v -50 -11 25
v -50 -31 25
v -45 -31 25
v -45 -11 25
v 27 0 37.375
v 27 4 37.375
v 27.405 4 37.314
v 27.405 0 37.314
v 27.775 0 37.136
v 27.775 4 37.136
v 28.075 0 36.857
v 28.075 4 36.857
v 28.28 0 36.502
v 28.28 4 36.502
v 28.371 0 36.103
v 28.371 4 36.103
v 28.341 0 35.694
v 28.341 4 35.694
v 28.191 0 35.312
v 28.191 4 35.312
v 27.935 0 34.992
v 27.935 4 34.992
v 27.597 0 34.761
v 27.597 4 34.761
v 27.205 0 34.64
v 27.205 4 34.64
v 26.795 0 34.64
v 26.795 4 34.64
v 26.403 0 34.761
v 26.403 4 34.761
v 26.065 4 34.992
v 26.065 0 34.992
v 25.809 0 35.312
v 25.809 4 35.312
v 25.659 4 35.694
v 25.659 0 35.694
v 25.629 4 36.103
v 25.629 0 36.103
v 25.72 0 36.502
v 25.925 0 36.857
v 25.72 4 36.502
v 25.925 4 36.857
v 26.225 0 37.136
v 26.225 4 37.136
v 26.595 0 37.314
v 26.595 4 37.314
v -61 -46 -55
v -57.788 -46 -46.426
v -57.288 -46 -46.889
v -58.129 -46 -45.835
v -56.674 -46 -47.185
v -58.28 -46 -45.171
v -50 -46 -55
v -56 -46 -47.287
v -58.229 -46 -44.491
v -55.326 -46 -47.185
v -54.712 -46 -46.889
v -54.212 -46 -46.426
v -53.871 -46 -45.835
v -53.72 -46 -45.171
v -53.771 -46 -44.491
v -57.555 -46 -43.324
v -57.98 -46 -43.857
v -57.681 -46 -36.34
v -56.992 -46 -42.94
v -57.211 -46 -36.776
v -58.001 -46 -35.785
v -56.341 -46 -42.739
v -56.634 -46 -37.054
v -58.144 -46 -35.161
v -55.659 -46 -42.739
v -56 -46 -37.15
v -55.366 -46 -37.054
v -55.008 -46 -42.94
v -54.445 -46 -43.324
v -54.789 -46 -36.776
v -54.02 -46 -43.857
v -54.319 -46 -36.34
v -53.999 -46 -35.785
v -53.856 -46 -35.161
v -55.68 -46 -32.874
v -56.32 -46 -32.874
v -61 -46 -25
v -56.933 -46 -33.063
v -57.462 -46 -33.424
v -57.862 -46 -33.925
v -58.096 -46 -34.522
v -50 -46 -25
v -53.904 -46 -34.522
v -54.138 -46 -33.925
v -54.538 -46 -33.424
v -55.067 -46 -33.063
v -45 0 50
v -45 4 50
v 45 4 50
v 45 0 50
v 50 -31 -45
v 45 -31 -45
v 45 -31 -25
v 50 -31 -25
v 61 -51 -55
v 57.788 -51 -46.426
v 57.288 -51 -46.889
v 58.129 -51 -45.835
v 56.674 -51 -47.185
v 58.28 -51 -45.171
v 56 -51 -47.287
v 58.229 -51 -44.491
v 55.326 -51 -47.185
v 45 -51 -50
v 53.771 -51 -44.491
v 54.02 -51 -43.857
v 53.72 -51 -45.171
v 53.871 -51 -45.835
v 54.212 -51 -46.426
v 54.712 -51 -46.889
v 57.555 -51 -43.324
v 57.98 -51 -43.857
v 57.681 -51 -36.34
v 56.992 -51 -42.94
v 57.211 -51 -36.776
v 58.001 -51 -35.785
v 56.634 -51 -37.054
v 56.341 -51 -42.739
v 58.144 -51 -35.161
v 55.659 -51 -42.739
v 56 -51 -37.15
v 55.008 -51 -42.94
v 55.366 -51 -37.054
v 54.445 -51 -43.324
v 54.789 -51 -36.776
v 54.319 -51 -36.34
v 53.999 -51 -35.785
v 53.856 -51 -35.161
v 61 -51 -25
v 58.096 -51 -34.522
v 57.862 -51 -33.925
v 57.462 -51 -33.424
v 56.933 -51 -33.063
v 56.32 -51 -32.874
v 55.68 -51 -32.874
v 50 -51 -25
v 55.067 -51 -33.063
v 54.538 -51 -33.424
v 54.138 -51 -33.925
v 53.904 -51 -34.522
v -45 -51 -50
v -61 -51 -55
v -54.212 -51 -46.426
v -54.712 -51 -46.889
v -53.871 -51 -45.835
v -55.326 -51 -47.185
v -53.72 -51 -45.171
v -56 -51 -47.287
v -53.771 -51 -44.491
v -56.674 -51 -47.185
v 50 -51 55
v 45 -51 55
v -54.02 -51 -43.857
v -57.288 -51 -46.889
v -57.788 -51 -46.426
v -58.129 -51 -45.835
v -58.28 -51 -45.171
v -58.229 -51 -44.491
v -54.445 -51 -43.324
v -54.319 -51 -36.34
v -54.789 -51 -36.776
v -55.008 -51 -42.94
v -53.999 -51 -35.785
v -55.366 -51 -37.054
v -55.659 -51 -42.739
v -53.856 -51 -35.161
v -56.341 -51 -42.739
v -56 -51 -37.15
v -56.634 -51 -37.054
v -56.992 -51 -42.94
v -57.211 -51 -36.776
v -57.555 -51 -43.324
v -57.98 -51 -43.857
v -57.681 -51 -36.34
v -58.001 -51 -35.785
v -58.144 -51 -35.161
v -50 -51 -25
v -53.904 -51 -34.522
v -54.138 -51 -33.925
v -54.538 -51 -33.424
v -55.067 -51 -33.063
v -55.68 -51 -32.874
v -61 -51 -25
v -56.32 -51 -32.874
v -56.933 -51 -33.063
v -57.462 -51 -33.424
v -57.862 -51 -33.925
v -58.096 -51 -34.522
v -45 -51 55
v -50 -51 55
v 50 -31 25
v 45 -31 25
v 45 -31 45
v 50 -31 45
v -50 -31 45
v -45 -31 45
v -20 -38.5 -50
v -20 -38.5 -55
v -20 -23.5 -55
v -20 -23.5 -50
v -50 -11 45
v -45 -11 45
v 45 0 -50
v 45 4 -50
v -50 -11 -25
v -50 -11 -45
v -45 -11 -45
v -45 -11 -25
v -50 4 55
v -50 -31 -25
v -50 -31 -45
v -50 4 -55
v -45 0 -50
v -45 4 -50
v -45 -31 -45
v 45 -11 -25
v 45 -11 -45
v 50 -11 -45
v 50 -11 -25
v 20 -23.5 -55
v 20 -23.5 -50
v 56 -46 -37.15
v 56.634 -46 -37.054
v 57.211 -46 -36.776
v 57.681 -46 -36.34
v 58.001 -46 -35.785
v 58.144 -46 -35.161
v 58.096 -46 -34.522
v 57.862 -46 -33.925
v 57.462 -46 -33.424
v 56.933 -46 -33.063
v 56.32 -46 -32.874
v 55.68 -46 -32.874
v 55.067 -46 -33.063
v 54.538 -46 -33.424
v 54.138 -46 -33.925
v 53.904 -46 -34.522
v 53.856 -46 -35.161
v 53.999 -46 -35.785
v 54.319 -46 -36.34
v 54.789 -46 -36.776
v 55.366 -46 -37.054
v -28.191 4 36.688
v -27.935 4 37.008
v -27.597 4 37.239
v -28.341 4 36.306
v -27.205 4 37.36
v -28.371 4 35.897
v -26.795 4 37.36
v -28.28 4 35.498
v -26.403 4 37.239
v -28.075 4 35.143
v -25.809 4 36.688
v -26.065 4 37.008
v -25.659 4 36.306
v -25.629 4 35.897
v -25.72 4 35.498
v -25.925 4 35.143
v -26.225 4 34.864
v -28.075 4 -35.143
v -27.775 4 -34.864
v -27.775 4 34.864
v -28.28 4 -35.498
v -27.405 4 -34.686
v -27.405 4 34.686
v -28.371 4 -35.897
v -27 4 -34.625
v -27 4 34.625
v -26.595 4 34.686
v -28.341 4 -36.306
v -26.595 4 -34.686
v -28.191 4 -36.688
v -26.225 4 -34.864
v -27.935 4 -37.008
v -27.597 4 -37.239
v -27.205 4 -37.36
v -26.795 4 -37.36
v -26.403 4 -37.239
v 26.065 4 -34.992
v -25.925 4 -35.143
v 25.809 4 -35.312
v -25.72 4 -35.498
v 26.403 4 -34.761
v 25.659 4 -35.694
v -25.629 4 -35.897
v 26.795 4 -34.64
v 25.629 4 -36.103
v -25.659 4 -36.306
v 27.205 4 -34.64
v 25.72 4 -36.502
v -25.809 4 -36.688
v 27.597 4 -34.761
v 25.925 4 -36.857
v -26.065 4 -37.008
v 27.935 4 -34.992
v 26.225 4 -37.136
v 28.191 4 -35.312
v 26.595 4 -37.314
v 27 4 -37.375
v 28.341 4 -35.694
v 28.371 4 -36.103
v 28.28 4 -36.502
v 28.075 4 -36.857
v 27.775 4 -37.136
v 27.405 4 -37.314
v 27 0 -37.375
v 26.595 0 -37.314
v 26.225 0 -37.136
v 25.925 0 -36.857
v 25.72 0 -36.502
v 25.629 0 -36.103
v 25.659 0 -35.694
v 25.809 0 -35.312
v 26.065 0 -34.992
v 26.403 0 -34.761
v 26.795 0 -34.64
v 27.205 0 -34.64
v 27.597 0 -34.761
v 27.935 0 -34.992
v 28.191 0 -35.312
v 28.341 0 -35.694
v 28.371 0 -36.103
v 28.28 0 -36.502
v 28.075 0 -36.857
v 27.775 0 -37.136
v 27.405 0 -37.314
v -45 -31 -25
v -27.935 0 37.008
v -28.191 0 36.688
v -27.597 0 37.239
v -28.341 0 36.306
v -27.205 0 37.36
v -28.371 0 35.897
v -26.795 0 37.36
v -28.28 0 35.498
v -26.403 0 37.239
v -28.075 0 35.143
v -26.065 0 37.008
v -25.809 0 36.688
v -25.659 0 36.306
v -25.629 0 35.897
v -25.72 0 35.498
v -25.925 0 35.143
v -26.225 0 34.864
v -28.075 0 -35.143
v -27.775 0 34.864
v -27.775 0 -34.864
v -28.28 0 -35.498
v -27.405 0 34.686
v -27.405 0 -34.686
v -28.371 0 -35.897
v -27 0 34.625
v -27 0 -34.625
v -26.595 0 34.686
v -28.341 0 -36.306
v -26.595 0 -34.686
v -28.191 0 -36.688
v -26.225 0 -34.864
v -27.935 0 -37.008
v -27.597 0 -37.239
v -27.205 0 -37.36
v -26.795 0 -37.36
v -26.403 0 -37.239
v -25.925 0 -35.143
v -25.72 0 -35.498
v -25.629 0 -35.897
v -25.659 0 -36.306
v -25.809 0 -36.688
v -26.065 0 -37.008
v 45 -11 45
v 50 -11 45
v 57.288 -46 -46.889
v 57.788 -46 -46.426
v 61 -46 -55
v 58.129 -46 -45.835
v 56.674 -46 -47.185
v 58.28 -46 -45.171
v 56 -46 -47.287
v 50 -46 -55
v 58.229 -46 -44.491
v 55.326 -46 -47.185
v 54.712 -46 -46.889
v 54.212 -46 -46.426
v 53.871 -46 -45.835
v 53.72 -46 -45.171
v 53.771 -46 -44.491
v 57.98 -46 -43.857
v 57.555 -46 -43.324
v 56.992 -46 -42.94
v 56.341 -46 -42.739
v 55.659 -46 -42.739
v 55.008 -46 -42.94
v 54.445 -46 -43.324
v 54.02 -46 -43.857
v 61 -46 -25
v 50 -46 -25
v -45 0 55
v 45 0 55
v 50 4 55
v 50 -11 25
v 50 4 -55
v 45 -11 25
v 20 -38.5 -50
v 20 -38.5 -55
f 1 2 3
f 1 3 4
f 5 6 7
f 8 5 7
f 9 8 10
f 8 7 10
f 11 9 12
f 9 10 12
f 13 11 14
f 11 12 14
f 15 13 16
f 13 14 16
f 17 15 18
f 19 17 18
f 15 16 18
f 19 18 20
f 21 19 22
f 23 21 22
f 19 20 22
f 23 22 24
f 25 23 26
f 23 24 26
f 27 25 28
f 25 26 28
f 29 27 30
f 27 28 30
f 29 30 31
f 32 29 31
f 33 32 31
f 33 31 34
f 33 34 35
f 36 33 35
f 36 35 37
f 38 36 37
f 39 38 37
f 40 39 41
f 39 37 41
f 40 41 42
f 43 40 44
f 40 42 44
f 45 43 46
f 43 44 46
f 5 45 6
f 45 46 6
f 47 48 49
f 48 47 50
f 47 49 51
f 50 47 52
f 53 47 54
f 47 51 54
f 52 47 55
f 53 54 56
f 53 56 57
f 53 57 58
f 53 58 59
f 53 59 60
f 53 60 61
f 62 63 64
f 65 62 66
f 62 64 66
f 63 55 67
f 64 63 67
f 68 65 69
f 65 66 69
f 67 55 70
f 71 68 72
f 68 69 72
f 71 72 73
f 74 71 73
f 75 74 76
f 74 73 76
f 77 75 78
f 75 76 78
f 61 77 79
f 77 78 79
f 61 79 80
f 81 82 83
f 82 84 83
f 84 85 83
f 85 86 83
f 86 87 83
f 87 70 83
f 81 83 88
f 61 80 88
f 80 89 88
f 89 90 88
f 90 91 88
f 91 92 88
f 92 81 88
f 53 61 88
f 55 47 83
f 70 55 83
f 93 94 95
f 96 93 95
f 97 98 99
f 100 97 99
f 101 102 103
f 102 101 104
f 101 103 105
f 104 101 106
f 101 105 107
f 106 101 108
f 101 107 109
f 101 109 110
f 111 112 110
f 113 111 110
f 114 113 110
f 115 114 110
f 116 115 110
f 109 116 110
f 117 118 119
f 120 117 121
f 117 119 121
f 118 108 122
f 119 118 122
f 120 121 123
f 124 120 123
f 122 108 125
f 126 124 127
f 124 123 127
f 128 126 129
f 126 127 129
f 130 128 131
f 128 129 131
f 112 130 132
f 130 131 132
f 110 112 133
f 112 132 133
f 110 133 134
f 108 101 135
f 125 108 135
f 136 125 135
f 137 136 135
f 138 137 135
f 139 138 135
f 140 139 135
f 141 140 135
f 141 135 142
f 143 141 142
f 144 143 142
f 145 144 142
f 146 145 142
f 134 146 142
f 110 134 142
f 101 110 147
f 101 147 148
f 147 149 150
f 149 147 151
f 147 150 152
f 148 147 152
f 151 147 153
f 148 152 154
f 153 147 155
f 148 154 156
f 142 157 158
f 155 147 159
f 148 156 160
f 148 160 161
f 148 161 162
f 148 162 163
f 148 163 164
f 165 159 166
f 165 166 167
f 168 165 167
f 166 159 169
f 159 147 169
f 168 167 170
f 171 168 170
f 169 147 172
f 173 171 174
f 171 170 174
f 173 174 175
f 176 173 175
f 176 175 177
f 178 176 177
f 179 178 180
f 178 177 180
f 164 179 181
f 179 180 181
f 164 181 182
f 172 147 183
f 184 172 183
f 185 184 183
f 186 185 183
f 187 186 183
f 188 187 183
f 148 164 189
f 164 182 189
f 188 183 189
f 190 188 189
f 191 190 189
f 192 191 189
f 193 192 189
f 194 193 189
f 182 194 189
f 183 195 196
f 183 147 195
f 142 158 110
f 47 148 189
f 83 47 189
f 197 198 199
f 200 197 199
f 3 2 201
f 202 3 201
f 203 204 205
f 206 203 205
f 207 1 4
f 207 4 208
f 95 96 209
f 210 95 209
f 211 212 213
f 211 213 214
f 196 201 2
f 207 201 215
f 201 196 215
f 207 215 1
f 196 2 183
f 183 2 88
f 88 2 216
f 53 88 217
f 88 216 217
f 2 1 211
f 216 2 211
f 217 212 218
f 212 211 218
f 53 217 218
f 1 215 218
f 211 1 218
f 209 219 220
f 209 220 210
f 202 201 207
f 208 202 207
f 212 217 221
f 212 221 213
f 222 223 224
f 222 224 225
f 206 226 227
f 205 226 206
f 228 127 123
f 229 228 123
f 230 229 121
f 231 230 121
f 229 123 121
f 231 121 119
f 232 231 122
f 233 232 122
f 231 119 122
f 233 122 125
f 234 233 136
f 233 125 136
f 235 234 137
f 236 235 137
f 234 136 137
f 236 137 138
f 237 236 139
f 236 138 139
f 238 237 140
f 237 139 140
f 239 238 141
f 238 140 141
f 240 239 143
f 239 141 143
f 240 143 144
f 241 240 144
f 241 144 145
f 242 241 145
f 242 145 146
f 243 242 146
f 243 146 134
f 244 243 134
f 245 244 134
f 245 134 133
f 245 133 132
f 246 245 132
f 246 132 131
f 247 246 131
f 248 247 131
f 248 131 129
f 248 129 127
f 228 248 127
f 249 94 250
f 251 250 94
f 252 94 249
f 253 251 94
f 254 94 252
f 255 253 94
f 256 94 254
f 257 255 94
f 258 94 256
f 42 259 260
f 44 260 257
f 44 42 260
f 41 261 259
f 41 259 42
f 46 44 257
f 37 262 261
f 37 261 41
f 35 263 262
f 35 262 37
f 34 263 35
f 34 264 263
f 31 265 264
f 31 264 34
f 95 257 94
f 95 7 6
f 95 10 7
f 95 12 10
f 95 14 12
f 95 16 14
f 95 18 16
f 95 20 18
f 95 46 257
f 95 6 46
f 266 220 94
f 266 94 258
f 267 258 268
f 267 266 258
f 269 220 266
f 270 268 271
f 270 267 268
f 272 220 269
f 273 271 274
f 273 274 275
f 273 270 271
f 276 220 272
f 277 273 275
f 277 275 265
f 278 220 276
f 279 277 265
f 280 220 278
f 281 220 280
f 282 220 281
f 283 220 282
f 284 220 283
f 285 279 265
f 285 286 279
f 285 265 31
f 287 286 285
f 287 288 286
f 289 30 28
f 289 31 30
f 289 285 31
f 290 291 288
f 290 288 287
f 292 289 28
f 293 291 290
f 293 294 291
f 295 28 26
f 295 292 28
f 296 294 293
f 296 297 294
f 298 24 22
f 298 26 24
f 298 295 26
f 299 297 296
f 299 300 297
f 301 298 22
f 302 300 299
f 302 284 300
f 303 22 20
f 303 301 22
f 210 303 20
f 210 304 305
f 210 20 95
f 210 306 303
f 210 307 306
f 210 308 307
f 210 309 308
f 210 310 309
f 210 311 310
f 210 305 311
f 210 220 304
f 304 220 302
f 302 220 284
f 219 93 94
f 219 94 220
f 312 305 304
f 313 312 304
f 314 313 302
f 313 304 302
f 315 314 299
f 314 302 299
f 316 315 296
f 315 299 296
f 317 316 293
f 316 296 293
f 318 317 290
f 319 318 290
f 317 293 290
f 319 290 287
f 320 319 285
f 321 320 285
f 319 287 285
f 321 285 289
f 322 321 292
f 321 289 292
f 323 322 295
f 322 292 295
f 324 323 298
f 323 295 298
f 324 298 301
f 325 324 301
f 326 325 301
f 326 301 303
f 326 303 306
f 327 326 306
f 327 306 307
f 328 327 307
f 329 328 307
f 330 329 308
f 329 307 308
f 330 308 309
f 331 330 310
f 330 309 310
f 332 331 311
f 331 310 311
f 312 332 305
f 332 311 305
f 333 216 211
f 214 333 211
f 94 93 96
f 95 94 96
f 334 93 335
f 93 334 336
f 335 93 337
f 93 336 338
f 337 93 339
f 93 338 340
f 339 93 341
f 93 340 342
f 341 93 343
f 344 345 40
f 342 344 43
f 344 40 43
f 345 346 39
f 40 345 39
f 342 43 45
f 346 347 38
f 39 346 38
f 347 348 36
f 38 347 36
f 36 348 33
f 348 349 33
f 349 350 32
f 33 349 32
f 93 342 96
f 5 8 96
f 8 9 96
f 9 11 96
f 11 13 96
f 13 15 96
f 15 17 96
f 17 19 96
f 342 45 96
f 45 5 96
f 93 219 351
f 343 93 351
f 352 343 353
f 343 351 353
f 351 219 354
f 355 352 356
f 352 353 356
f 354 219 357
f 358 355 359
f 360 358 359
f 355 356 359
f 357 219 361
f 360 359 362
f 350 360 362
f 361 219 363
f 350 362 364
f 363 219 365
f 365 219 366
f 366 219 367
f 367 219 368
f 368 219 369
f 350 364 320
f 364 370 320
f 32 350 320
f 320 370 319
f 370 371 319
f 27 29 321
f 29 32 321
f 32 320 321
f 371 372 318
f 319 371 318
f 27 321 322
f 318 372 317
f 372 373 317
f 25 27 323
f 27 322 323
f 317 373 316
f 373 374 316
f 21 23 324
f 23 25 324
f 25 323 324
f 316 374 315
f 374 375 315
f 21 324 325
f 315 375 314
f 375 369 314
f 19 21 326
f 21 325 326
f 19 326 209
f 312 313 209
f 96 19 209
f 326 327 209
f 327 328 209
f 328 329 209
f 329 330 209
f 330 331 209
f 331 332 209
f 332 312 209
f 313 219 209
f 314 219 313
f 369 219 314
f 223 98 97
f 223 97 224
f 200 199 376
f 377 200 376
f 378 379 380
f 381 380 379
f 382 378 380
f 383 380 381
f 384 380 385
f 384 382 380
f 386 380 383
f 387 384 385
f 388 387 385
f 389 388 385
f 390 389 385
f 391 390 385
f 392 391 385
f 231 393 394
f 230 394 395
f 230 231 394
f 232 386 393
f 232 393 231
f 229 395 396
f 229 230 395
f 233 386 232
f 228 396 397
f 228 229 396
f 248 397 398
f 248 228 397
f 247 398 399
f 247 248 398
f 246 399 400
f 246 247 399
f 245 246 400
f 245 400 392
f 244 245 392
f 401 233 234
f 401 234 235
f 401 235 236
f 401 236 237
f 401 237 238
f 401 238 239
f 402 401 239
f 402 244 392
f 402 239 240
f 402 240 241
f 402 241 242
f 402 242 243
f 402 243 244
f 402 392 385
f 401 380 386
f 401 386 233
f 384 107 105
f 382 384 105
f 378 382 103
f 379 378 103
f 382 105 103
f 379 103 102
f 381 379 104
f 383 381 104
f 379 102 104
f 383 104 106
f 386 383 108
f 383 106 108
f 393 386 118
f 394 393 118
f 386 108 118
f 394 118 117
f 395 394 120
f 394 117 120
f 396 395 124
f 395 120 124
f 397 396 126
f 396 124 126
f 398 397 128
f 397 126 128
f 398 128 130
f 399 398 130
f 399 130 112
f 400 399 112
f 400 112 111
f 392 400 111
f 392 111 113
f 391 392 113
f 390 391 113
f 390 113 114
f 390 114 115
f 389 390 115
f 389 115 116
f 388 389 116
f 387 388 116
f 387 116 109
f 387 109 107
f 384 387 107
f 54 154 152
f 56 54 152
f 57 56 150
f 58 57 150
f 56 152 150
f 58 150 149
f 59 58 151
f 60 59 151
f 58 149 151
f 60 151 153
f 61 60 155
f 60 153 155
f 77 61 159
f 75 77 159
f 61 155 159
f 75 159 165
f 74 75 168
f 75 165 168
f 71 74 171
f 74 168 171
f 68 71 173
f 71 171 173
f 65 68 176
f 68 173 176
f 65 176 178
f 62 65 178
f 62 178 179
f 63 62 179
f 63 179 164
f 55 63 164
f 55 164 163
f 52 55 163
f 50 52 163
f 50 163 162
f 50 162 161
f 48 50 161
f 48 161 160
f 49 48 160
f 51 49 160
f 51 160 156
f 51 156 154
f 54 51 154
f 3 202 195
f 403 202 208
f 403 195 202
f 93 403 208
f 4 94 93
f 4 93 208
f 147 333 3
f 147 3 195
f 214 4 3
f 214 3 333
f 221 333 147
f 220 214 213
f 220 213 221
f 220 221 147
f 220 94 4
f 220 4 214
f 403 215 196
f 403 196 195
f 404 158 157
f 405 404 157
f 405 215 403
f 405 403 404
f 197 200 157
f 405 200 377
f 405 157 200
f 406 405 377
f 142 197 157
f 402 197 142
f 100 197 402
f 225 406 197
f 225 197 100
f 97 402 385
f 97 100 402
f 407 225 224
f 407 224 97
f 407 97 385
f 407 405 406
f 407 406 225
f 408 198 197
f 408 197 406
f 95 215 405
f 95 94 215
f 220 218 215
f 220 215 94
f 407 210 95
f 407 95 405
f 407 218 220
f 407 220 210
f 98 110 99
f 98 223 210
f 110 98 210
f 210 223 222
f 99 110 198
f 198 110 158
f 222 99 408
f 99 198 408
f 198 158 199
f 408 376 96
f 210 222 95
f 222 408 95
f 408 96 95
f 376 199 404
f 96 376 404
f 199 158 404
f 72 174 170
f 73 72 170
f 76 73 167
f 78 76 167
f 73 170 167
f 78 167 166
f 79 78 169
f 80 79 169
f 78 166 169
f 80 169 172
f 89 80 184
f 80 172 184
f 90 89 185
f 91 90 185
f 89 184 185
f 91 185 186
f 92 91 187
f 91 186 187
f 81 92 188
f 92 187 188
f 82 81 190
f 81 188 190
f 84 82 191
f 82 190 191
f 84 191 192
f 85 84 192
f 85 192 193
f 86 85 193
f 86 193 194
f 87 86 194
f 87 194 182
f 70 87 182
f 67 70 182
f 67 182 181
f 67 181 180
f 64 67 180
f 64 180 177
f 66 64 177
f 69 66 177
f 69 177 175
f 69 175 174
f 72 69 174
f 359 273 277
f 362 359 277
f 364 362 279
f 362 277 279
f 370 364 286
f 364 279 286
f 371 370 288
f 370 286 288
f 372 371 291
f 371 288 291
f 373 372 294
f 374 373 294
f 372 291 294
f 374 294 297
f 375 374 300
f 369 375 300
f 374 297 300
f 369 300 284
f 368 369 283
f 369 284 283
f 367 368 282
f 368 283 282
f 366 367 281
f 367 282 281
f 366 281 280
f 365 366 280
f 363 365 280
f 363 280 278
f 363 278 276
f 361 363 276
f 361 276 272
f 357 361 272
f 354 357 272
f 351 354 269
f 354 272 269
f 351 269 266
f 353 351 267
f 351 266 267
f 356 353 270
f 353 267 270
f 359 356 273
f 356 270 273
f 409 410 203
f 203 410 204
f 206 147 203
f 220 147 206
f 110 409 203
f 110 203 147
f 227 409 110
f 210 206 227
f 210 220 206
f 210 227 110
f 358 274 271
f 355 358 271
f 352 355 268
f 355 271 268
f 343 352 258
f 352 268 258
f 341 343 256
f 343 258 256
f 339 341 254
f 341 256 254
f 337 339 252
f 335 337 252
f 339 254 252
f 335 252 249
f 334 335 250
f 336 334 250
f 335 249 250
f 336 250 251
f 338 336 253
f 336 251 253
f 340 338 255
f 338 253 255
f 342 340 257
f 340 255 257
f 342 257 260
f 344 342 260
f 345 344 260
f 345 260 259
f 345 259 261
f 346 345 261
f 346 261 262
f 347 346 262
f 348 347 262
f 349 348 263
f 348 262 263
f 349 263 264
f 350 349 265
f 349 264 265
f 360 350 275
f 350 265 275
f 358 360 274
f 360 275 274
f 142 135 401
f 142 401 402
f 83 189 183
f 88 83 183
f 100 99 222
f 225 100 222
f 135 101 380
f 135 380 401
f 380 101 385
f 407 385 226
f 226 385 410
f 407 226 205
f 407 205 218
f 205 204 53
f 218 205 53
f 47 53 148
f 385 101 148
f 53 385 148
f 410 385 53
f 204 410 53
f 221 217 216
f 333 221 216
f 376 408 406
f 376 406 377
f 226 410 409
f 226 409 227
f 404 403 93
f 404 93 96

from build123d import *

# Parameters (mm, degrees)
SKETCH1_W           = 90
SKETCH1_H           = 100
BOSS_EXTRUDE1_DEPTH = 4
SKETCH2_R           = 1.375
CUT_EXTRUDE1_DEPTH  = 4
SKETCH3_W           = 100
SKETCH3_H           = 110
SKETCH3_W_2         = 90
SKETCH3_H_2         = 100
BOSS_EXTRUDE2_DEPTH = 55
SKETCH4_W           = 11
SKETCH4_H           = 30
BOSS_EXTRUDE3_DEPTH = 5
SKETCH5_R           = 2.286590725
SKETCH5_R_2         = 2.149881735
CUT_EXTRUDE2_DEPTH  = 99.848368727
SKETCH6_W           = 90
SKETCH6_H           = 51
CUT_EXTRUDE3_DEPTH  = 10
SKETCH7_W           = 20
SKETCH7_H           = 20
CUT_EXTRUDE4_DEPTH  = 134.966413701
SKETCH8_W           = 40
SKETCH8_H           = 15
CUT_EXTRUDE5_DEPTH  = 136.727668513


with BuildPart() as part:
    # Sketch1 → Boss-Extrude1 (new body)
    with BuildSketch(Plane(origin=(0, 0, 0), x_dir=(1, 0, 0), z_dir=(0, 1, 0))):
        Rectangle(SKETCH1_W, SKETCH1_H)
    extrude(amount=BOSS_EXTRUDE1_DEPTH)

    # Sketch2 → Cut-Extrude1 (cut)
    with BuildSketch(Plane(origin=(0, 4, 0), x_dir=(1, 0, 0), z_dir=(0, 1, 0))):
        with Locations(Location((-27, 36, 0), (0, 0, 270))):
            Circle(SKETCH2_R)
        with Locations(Location((27, 36, 0), (0, 0, 90))):
            Circle(SKETCH2_R)
        with Locations(Location((27, -36, 0), (0, 0, 270))):
            Circle(SKETCH2_R)
        with Locations(Location((-27, -36, 0), (0, 0, 90))):
            Circle(SKETCH2_R)
    extrude(amount=-CUT_EXTRUDE1_DEPTH, mode=Mode.SUBTRACT)


with BuildPart() as body_2:
    # Sketch3 → Boss-Extrude2 (new body)
    with BuildSketch(Plane(origin=(0, 4, 0), x_dir=(1, 0, 0), z_dir=(0, 1, 0))):
        Rectangle(SKETCH3_W, SKETCH3_H)
        Rectangle(SKETCH3_W_2, SKETCH3_H_2, mode=Mode.SUBTRACT)
    extrude(amount=-BOSS_EXTRUDE2_DEPTH)

    # Sketch4 → Boss-Extrude3 (add)
    with BuildSketch(Plane.XZ.offset(51)):
        with Locations((-55.5, -40)):
            Rectangle(SKETCH4_W, SKETCH4_H)
    boss_extrude3 = extrude(amount=-BOSS_EXTRUDE3_DEPTH)

    # Mirror1: Boss-Extrude3 across plane
    add(boss_extrude3.mirror(Plane(origin=(0, 0, 0), x_dir=(0, 0, 1), z_dir=(1, 0, 0))))

    # Sketch5 → Cut-Extrude2 (cut, through all)
    with BuildSketch(Plane.XZ.offset(51)):
        with Locations(Location((-56, -45, 0), (0, 0, 270))):
            Circle(SKETCH5_R)
        with Locations(Location((-56, -35, 0), (0, 0, 270))):
            Circle(SKETCH5_R_2)
        with Locations(Location((56, -45, 0), (0, 0, 270))):
            Circle(SKETCH5_R)
        with Locations(Location((56, -35, 0), (0, 0, 270))):
            Circle(SKETCH5_R_2)
    extrude(amount=-CUT_EXTRUDE2_DEPTH, mode=Mode.SUBTRACT)

    # Sketch6 → Cut-Extrude3 (cut)
    with BuildSketch(Plane.XY.offset(55)):
        with Locations((0, -25.5)):
            Rectangle(SKETCH6_W, SKETCH6_H)
    extrude(amount=-CUT_EXTRUDE3_DEPTH, mode=Mode.SUBTRACT)

    # Sketch7 → Cut-Extrude4 (cut, through all)
    with BuildSketch(Plane.ZY.offset(50)):
        with Locations((-35, -21)):
            Rectangle(SKETCH7_W, SKETCH7_H)
        with Locations((35, -21)):
            Rectangle(SKETCH7_W, SKETCH7_H)
    extrude(amount=-CUT_EXTRUDE4_DEPTH, mode=Mode.SUBTRACT)

    # Sketch8 → Cut-Extrude5 (cut, through all)
    with BuildSketch(Plane(origin=(0, 0, -55), x_dir=(-1, 0, 0), z_dir=(0, 0, -1))):
        with Locations((0, -31)):
            Rectangle(SKETCH8_W, SKETCH8_H)
    extrude(amount=-CUT_EXTRUDE5_DEPTH, mode=Mode.SUBTRACT)


solid = Compound([part.part, body_2.part])
